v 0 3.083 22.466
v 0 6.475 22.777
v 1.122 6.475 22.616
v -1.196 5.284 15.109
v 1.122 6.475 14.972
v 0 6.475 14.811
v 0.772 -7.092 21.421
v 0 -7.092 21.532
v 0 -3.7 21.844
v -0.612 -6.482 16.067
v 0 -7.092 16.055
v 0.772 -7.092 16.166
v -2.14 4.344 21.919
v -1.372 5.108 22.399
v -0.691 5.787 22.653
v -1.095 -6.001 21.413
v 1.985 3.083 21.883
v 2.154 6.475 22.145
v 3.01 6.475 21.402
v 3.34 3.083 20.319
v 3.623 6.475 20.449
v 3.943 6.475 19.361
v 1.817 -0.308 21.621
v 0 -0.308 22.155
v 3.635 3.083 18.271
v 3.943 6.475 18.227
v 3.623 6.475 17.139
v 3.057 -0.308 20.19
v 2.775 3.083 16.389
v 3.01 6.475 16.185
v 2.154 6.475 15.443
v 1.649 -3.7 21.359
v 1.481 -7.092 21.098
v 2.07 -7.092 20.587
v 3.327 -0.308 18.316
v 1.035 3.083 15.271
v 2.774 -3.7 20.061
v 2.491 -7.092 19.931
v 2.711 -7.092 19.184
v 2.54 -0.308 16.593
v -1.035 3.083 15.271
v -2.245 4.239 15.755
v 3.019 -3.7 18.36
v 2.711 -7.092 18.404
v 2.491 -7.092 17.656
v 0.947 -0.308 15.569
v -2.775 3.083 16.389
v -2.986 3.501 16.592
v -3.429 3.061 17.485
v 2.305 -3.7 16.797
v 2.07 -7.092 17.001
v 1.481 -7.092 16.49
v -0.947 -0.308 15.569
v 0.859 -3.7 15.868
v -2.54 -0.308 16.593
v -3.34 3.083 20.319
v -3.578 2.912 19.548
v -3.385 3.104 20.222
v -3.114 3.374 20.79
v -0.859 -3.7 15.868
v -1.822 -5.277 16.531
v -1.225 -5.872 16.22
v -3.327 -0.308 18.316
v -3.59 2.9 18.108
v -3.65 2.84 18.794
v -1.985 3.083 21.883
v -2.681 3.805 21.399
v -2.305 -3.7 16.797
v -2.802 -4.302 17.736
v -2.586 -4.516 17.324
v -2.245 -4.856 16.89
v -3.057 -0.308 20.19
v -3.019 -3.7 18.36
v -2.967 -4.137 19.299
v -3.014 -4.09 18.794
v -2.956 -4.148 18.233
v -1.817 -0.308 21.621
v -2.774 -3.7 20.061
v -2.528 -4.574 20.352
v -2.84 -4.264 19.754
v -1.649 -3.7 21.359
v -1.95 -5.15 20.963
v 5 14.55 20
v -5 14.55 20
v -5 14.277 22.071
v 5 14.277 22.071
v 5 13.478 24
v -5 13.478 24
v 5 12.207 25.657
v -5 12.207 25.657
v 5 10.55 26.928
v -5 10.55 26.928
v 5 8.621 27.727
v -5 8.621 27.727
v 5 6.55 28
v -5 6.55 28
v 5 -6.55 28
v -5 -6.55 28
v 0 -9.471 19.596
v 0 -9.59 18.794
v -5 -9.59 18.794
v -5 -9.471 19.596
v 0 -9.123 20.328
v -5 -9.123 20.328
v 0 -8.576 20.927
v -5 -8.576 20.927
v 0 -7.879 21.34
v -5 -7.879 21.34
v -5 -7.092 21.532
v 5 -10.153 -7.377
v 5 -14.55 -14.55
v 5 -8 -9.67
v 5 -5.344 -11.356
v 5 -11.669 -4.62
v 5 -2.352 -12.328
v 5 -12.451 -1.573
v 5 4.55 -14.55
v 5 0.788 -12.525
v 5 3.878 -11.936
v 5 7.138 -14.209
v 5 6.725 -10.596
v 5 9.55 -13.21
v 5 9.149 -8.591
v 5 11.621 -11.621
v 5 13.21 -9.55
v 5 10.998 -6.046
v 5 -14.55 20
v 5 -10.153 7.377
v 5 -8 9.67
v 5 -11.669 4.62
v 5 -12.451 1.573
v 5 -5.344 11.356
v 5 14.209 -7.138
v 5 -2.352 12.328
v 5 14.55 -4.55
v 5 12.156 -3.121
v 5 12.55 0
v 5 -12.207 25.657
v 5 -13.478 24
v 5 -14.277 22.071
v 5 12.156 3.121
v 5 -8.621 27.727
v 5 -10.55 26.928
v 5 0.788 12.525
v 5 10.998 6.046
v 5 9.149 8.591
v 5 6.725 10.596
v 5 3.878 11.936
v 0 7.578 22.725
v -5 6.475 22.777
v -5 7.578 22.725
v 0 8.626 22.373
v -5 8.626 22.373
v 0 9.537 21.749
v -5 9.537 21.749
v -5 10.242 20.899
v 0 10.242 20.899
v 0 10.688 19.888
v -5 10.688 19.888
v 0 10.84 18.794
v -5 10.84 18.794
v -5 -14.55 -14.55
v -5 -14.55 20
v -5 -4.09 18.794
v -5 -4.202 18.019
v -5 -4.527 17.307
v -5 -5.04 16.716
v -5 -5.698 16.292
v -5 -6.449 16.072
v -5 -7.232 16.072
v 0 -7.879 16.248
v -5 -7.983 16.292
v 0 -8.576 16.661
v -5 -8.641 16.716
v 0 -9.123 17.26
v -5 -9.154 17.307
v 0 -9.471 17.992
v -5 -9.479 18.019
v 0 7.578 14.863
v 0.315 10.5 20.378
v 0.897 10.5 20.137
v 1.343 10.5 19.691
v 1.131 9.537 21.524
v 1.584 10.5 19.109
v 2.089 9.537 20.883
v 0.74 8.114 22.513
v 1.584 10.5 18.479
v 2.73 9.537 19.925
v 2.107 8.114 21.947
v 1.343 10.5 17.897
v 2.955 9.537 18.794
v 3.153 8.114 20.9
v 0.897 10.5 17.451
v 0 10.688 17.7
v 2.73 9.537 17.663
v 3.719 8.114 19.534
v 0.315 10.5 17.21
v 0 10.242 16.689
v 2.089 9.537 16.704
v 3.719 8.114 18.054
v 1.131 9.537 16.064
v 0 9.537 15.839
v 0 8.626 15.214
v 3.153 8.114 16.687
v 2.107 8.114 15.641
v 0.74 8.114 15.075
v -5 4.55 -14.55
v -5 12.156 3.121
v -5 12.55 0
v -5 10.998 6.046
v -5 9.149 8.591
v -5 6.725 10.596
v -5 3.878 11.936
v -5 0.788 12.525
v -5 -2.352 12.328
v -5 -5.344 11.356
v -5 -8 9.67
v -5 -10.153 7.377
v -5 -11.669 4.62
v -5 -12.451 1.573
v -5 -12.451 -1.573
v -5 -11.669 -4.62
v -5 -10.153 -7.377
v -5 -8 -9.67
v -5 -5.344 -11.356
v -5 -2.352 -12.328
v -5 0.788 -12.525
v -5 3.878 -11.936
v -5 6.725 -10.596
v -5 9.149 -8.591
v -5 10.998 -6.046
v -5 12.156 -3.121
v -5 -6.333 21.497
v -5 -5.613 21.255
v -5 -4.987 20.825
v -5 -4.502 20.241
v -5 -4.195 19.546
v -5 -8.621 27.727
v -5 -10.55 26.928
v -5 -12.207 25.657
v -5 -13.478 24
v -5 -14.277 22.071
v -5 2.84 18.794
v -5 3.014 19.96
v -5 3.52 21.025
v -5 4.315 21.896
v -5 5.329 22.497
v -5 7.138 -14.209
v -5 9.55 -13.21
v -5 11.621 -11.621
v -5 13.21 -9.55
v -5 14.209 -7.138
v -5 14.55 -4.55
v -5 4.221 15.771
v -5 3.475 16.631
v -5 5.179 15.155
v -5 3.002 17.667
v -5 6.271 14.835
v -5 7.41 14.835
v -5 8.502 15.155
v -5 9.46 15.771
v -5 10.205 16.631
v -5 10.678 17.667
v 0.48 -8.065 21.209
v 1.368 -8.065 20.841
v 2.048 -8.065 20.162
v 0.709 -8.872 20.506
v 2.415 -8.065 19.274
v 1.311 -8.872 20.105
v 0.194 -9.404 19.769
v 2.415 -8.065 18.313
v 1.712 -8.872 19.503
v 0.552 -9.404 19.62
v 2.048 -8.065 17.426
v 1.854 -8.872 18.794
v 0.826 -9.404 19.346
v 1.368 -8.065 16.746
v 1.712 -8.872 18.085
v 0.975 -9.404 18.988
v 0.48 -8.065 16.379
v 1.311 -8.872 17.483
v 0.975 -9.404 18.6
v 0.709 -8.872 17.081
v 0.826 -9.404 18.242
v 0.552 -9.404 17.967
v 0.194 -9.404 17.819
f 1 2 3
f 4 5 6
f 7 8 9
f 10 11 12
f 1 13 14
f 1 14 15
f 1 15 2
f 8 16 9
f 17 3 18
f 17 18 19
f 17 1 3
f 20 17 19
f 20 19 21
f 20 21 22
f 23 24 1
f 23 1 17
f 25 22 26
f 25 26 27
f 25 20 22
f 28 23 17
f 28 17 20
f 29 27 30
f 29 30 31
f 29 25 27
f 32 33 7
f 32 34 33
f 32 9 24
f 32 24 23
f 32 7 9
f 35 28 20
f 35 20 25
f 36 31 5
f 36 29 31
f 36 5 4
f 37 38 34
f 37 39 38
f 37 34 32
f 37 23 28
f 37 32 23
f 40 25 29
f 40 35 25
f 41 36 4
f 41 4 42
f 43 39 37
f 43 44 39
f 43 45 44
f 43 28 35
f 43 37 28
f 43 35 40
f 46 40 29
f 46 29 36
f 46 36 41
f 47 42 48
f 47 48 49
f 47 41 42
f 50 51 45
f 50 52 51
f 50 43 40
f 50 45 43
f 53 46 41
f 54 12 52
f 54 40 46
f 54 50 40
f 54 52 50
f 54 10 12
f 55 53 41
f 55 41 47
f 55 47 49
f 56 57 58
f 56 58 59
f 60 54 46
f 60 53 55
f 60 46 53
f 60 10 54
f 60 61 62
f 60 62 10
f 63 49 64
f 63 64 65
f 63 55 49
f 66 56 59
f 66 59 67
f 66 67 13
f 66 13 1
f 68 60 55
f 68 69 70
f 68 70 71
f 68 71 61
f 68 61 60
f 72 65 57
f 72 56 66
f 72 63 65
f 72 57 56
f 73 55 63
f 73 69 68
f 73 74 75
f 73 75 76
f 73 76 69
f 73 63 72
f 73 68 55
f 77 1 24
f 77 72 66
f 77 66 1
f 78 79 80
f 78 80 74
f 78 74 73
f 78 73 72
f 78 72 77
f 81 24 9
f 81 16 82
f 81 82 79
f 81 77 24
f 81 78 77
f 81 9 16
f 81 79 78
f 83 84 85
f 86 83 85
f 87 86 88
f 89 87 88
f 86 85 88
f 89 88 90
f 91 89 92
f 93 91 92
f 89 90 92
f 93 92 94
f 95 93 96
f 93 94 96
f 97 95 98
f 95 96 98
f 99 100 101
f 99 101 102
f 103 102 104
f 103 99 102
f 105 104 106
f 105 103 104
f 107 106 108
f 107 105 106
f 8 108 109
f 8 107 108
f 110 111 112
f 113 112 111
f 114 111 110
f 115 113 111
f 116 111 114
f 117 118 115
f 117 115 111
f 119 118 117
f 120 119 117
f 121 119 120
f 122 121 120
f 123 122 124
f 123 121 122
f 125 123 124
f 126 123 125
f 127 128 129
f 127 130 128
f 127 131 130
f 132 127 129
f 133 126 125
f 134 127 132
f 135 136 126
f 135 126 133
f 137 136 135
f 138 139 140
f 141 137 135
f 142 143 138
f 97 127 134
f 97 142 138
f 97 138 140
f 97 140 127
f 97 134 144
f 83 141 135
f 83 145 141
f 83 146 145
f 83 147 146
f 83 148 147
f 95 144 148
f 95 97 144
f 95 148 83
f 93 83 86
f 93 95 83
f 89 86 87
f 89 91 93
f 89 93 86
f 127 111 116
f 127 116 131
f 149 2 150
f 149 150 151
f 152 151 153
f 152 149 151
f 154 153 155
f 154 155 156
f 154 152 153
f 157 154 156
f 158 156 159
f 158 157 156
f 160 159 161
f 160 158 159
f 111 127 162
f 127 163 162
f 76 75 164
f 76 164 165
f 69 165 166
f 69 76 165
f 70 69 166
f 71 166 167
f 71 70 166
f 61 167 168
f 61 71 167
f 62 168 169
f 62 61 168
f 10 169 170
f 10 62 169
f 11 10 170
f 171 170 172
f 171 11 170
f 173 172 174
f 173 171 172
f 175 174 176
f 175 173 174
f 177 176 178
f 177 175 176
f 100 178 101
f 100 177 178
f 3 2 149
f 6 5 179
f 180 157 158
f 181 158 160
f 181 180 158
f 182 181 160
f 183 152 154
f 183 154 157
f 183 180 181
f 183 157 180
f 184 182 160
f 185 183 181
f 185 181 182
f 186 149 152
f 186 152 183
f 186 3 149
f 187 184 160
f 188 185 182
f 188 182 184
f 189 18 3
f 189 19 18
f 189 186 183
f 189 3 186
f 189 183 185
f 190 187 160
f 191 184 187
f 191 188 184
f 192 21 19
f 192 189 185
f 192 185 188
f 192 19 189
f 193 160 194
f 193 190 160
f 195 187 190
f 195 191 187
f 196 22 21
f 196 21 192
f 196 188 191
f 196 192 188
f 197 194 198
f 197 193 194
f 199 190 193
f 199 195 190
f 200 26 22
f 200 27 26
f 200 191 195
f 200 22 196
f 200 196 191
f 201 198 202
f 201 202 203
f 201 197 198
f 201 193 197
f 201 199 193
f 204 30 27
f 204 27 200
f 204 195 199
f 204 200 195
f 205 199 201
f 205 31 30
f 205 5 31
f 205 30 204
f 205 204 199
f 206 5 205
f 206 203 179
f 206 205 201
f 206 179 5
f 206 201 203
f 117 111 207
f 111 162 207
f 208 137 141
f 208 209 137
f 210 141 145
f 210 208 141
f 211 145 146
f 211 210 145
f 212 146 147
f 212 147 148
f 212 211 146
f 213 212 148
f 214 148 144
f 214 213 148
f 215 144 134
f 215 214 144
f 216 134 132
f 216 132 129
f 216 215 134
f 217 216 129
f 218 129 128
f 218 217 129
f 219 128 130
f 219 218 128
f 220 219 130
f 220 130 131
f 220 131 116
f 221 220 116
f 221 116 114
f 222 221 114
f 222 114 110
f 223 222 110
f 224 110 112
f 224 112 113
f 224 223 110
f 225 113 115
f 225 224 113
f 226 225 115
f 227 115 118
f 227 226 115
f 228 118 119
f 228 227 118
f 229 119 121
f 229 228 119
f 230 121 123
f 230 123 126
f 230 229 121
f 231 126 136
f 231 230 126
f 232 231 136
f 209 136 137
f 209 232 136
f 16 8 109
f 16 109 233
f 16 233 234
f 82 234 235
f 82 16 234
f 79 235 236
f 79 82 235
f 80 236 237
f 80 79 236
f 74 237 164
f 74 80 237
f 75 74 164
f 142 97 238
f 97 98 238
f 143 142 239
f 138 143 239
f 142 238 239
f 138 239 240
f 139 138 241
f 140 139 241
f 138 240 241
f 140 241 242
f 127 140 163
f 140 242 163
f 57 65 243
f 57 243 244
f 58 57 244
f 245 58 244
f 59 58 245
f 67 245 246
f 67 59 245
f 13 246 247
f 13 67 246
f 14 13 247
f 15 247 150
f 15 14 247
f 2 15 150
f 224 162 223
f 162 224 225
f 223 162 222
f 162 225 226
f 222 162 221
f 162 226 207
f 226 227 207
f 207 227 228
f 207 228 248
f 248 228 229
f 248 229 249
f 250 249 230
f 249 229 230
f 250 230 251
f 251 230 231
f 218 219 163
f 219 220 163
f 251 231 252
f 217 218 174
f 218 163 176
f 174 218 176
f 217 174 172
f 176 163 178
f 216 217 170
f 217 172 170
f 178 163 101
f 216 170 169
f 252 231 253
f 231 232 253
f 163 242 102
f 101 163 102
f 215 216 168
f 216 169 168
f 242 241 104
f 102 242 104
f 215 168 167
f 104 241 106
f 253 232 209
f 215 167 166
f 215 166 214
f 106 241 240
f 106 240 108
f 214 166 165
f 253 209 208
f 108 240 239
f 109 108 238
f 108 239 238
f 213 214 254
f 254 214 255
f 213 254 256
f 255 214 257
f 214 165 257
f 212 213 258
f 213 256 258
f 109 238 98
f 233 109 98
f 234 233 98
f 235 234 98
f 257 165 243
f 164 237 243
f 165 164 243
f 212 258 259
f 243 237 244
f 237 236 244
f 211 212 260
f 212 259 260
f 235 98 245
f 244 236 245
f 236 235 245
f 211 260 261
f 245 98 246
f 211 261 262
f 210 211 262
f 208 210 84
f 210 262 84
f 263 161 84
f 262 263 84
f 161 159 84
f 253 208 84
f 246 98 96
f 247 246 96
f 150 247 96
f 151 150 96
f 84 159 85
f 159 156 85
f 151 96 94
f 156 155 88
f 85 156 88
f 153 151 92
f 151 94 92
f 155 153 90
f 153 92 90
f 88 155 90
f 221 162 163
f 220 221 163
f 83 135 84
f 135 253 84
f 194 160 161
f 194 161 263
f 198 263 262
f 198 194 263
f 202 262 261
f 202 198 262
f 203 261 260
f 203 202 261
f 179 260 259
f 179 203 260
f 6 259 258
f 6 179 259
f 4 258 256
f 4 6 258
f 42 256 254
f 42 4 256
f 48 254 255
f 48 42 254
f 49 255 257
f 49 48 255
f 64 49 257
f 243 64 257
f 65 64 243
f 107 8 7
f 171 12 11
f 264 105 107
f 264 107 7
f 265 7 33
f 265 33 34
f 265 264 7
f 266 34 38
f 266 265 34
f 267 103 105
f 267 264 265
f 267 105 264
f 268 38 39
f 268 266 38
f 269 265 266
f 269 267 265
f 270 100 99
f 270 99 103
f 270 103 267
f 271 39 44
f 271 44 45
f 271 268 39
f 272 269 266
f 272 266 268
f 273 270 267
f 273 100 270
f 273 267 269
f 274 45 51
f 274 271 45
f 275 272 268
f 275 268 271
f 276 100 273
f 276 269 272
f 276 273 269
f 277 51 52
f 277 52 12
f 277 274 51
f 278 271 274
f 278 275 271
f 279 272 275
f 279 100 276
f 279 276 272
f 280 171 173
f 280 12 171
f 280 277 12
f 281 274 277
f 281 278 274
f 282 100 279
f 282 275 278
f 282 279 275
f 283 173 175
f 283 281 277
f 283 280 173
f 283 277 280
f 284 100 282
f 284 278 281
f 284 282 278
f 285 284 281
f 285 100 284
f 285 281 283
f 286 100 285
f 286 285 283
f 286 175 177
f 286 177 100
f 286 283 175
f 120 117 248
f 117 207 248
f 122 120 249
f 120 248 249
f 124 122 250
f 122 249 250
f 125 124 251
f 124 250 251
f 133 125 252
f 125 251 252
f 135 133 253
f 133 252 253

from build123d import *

# Parameters (mm, degrees)
F0_R     = 12.55
F1_DEPTH = 5
F2_DEPTH = 5
F3_R     = 10


with BuildPart() as f1:
    # F0 (on Right) → F1 (new body)
    with BuildSketch(Plane.YZ):
        with BuildLine():
            ThreePointArc((14.55, 20), (12.2068542495, 25.6568542495), (6.55, 28))
            Line((6.55, 28), (-6.55, 28))
            ThreePointArc((-6.55, 28), (-12.2068542495, 25.6568542495), (-14.55, 20))
            Line((-14.55, 20), (-14.55, -14.55))
            Line((-14.55, -14.55), (14.55, -14.55))
            Line((14.55, -14.55), (14.55, 20))
        make_face()
        Circle(F0_R, mode=Mode.SUBTRACT)
        with BuildLine():
            Line((2.8404028665, 18.7938524157), (-4.0904028665, 18.7938524157))
            ThreePointArc((-4.0904028665, 18.7938524157), (-6.8404028665, 16.0438524157), (-9.5904028665, 18.7938524157))
            ThreePointArc((-9.5904028665, 18.7938524157), (-8.8718404378, 20.6474331111), (-7.0916673072, 21.5323494818))
            Line((-7.0916673072, 21.5323494818), (6.4749272755, 22.7771208717))
            ThreePointArc((6.4749272755, 22.7771208717), (9.5365202263, 21.748670715), (10.8404028665, 18.7938524157))
            ThreePointArc((10.8404028665, 18.7938524157), (6.8404028665, 14.7938524157), (2.8404028665, 18.7938524157))
        make_face(mode=Mode.SUBTRACT)
        with BuildLine():
            ThreePointArc((-7.0916673072, 21.5323494818), (-4.9868221712, 20.825289987), (-4.0904028665, 18.7938524157))
            Line((-4.0904028665, 18.7938524157), (2.8404028665, 18.7938524157))
            ThreePointArc((2.8404028665, 18.7938524157), (3.8855845672, 21.4899697755), (6.4749272755, 22.7771208717))
            Line((6.4749272755, 22.7771208717), (-7.0916673072, 21.5323494818))
        make_face()
    extrude(amount=-F1_DEPTH)

    # F0 (on Right) → F2 (join)
    with BuildSketch(Plane.YZ):
        with BuildLine():
            ThreePointArc((14.55, 20), (12.2068542495, 25.6568542495), (6.55, 28))
            Line((6.55, 28), (-6.55, 28))
            ThreePointArc((-6.55, 28), (-12.2068542495, 25.6568542495), (-14.55, 20))
            Line((-14.55, 20), (-14.55, -14.55))
            Line((-14.55, -14.55), (14.55, -14.55))
            Line((14.55, -14.55), (14.55, 20))
        make_face()
        Circle(F0_R, mode=Mode.SUBTRACT)
        with BuildLine():
            Line((2.8404028665, 18.7938524157), (-4.0904028665, 18.7938524157))
            ThreePointArc((-4.0904028665, 18.7938524157), (-6.8404028665, 16.0438524157), (-9.5904028665, 18.7938524157))
            ThreePointArc((-9.5904028665, 18.7938524157), (-8.8718404378, 20.6474331111), (-7.0916673072, 21.5323494818))
            Line((-7.0916673072, 21.5323494818), (6.4749272755, 22.7771208717))
            ThreePointArc((6.4749272755, 22.7771208717), (9.5365202263, 21.748670715), (10.8404028665, 18.7938524157))
            ThreePointArc((10.8404028665, 18.7938524157), (6.8404028665, 14.7938524157), (2.8404028665, 18.7938524157))
        make_face(mode=Mode.SUBTRACT)
        with BuildLine():
            ThreePointArc((-9.5904028665, 18.7938524157), (-6.8404028665, 16.0438524157), (-4.0904028665, 18.7938524157))
            Line((-4.0904028665, 18.7938524157), (-9.5904028665, 18.7938524157))
        make_face()
        with BuildLine():
            Line((-9.5904028665, 18.7938524157), (-4.0904028665, 18.7938524157))
            ThreePointArc((-4.0904028665, 18.7938524157), (-4.9868221712, 20.825289987), (-7.0916673072, 21.5323494818))
            ThreePointArc((-7.0916673072, 21.5323494818), (-8.8718404378, 20.6474331111), (-9.5904028665, 18.7938524157))
        make_face()
        with BuildLine():
            ThreePointArc((-7.0916673072, 21.5323494818), (-4.9868221712, 20.825289987), (-4.0904028665, 18.7938524157))
            Line((-4.0904028665, 18.7938524157), (2.8404028665, 18.7938524157))
            ThreePointArc((2.8404028665, 18.7938524157), (3.8855845672, 21.4899697755), (6.4749272755, 22.7771208717))
            Line((6.4749272755, 22.7771208717), (-7.0916673072, 21.5323494818))
        make_face()
        with BuildLine():
            ThreePointArc((6.4749272755, 22.7771208717), (3.8855845672, 21.4899697755), (2.8404028665, 18.7938524157))
            Line((2.8404028665, 18.7938524157), (10.8404028665, 18.7938524157))
            ThreePointArc((10.8404028665, 18.7938524157), (9.5365202263, 21.748670715), (6.4749272755, 22.7771208717))
        make_face()
        with BuildLine():
            Line((10.8404028665, 18.7938524157), (2.8404028665, 18.7938524157))
            ThreePointArc((2.8404028665, 18.7938524157), (6.8404028665, 14.7938524157), (10.8404028665, 18.7938524157))
        make_face()
    extrude(amount=F2_DEPTH)

    # F3
    f3_edges = [f1.edges().sort_by_distance(p)[0] for p in [
        (0, 14.55, -14.55),
    ]]
    fillet(f3_edges, radius=F3_R)

    # F0 (on Right) → F4 (revolve, cut)
    with BuildSketch(Plane.YZ):
        with BuildLine():
            Line((-9.5904028665, 18.7938524157), (-4.0904028665, 18.7938524157))
            ThreePointArc((-4.0904028665, 18.7938524157), (-4.9868221712, 20.825289987), (-7.0916673072, 21.5323494818))
            ThreePointArc((-7.0916673072, 21.5323494818), (-8.8718404378, 20.6474331111), (-9.5904028665, 18.7938524157))
        make_face()
        with BuildLine():
            ThreePointArc((-7.0916673072, 21.5323494818), (-4.9868221712, 20.825289987), (-4.0904028665, 18.7938524157))
            Line((-4.0904028665, 18.7938524157), (2.8404028665, 18.7938524157))
            ThreePointArc((2.8404028665, 18.7938524157), (3.8855845672, 21.4899697755), (6.4749272755, 22.7771208717))
            Line((6.4749272755, 22.7771208717), (-7.0916673072, 21.5323494818))
        make_face()
        with BuildLine():
            ThreePointArc((6.4749272755, 22.7771208717), (3.8855845672, 21.4899697755), (2.8404028665, 18.7938524157))
            Line((2.8404028665, 18.7938524157), (10.8404028665, 18.7938524157))
            ThreePointArc((10.8404028665, 18.7938524157), (9.5365202263, 21.748670715), (6.4749272755, 22.7771208717))
        make_face()
    revolve(axis=Axis((0, 0.625, 18.7938524157), (0, 1, 0)), mode=Mode.SUBTRACT)


solid = f1.part
